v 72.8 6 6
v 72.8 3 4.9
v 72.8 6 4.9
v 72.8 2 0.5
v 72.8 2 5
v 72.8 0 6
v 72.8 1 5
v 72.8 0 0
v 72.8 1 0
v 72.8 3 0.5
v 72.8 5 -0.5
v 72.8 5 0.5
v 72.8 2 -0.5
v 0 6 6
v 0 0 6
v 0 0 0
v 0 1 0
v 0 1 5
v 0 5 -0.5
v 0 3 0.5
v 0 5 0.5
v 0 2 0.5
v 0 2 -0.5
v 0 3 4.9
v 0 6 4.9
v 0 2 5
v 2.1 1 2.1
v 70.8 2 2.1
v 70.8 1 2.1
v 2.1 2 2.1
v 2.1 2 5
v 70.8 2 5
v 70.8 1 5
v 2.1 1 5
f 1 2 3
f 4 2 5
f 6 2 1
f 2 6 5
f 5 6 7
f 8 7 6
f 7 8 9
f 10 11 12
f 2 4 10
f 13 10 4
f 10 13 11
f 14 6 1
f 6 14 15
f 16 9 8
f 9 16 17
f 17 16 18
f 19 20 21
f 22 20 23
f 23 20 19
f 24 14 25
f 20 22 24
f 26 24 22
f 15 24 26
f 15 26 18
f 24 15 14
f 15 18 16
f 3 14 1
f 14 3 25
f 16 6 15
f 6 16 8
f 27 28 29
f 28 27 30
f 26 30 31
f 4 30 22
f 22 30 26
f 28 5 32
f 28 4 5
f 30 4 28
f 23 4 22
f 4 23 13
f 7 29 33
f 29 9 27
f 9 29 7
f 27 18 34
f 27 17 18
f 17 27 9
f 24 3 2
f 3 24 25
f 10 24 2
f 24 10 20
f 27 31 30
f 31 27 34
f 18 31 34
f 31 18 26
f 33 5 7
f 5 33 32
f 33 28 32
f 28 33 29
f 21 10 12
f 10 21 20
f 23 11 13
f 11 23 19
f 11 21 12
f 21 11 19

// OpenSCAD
WSCR = 73 - .2; // Width of the display's visible part.
MDISP = 3; // Width of the display's margin.
H = 6; // Height of the panel.
TFINGER = 2.1; // Depth of the groove that locks the panel in place.
WALL = 1; // Thickness of the walls.

module translucy() {
  color("white", alpha=.5)
    union() {
      difference() {
        cube([WSCR, H, H]);
        translate([-.1, WALL, -.1])
          cube([WSCR + .2, WALL, TFINGER + .1]);
        translate([-.1, H - MDISP, -.1])
          cube([WSCR + .2, 10, H - WALL]);
        translate([-.1, WALL, 0])
          cube([TFINGER + .1, WALL, H - WALL]);
        translate([WSCR - TFINGER + .1, WALL, 0])
          cube([TFINGER + .1, WALL, H - WALL]);
      }
      translate([0, 2, -.5])
        cube([WSCR, 3, 1]);
    }
}

translucy();
